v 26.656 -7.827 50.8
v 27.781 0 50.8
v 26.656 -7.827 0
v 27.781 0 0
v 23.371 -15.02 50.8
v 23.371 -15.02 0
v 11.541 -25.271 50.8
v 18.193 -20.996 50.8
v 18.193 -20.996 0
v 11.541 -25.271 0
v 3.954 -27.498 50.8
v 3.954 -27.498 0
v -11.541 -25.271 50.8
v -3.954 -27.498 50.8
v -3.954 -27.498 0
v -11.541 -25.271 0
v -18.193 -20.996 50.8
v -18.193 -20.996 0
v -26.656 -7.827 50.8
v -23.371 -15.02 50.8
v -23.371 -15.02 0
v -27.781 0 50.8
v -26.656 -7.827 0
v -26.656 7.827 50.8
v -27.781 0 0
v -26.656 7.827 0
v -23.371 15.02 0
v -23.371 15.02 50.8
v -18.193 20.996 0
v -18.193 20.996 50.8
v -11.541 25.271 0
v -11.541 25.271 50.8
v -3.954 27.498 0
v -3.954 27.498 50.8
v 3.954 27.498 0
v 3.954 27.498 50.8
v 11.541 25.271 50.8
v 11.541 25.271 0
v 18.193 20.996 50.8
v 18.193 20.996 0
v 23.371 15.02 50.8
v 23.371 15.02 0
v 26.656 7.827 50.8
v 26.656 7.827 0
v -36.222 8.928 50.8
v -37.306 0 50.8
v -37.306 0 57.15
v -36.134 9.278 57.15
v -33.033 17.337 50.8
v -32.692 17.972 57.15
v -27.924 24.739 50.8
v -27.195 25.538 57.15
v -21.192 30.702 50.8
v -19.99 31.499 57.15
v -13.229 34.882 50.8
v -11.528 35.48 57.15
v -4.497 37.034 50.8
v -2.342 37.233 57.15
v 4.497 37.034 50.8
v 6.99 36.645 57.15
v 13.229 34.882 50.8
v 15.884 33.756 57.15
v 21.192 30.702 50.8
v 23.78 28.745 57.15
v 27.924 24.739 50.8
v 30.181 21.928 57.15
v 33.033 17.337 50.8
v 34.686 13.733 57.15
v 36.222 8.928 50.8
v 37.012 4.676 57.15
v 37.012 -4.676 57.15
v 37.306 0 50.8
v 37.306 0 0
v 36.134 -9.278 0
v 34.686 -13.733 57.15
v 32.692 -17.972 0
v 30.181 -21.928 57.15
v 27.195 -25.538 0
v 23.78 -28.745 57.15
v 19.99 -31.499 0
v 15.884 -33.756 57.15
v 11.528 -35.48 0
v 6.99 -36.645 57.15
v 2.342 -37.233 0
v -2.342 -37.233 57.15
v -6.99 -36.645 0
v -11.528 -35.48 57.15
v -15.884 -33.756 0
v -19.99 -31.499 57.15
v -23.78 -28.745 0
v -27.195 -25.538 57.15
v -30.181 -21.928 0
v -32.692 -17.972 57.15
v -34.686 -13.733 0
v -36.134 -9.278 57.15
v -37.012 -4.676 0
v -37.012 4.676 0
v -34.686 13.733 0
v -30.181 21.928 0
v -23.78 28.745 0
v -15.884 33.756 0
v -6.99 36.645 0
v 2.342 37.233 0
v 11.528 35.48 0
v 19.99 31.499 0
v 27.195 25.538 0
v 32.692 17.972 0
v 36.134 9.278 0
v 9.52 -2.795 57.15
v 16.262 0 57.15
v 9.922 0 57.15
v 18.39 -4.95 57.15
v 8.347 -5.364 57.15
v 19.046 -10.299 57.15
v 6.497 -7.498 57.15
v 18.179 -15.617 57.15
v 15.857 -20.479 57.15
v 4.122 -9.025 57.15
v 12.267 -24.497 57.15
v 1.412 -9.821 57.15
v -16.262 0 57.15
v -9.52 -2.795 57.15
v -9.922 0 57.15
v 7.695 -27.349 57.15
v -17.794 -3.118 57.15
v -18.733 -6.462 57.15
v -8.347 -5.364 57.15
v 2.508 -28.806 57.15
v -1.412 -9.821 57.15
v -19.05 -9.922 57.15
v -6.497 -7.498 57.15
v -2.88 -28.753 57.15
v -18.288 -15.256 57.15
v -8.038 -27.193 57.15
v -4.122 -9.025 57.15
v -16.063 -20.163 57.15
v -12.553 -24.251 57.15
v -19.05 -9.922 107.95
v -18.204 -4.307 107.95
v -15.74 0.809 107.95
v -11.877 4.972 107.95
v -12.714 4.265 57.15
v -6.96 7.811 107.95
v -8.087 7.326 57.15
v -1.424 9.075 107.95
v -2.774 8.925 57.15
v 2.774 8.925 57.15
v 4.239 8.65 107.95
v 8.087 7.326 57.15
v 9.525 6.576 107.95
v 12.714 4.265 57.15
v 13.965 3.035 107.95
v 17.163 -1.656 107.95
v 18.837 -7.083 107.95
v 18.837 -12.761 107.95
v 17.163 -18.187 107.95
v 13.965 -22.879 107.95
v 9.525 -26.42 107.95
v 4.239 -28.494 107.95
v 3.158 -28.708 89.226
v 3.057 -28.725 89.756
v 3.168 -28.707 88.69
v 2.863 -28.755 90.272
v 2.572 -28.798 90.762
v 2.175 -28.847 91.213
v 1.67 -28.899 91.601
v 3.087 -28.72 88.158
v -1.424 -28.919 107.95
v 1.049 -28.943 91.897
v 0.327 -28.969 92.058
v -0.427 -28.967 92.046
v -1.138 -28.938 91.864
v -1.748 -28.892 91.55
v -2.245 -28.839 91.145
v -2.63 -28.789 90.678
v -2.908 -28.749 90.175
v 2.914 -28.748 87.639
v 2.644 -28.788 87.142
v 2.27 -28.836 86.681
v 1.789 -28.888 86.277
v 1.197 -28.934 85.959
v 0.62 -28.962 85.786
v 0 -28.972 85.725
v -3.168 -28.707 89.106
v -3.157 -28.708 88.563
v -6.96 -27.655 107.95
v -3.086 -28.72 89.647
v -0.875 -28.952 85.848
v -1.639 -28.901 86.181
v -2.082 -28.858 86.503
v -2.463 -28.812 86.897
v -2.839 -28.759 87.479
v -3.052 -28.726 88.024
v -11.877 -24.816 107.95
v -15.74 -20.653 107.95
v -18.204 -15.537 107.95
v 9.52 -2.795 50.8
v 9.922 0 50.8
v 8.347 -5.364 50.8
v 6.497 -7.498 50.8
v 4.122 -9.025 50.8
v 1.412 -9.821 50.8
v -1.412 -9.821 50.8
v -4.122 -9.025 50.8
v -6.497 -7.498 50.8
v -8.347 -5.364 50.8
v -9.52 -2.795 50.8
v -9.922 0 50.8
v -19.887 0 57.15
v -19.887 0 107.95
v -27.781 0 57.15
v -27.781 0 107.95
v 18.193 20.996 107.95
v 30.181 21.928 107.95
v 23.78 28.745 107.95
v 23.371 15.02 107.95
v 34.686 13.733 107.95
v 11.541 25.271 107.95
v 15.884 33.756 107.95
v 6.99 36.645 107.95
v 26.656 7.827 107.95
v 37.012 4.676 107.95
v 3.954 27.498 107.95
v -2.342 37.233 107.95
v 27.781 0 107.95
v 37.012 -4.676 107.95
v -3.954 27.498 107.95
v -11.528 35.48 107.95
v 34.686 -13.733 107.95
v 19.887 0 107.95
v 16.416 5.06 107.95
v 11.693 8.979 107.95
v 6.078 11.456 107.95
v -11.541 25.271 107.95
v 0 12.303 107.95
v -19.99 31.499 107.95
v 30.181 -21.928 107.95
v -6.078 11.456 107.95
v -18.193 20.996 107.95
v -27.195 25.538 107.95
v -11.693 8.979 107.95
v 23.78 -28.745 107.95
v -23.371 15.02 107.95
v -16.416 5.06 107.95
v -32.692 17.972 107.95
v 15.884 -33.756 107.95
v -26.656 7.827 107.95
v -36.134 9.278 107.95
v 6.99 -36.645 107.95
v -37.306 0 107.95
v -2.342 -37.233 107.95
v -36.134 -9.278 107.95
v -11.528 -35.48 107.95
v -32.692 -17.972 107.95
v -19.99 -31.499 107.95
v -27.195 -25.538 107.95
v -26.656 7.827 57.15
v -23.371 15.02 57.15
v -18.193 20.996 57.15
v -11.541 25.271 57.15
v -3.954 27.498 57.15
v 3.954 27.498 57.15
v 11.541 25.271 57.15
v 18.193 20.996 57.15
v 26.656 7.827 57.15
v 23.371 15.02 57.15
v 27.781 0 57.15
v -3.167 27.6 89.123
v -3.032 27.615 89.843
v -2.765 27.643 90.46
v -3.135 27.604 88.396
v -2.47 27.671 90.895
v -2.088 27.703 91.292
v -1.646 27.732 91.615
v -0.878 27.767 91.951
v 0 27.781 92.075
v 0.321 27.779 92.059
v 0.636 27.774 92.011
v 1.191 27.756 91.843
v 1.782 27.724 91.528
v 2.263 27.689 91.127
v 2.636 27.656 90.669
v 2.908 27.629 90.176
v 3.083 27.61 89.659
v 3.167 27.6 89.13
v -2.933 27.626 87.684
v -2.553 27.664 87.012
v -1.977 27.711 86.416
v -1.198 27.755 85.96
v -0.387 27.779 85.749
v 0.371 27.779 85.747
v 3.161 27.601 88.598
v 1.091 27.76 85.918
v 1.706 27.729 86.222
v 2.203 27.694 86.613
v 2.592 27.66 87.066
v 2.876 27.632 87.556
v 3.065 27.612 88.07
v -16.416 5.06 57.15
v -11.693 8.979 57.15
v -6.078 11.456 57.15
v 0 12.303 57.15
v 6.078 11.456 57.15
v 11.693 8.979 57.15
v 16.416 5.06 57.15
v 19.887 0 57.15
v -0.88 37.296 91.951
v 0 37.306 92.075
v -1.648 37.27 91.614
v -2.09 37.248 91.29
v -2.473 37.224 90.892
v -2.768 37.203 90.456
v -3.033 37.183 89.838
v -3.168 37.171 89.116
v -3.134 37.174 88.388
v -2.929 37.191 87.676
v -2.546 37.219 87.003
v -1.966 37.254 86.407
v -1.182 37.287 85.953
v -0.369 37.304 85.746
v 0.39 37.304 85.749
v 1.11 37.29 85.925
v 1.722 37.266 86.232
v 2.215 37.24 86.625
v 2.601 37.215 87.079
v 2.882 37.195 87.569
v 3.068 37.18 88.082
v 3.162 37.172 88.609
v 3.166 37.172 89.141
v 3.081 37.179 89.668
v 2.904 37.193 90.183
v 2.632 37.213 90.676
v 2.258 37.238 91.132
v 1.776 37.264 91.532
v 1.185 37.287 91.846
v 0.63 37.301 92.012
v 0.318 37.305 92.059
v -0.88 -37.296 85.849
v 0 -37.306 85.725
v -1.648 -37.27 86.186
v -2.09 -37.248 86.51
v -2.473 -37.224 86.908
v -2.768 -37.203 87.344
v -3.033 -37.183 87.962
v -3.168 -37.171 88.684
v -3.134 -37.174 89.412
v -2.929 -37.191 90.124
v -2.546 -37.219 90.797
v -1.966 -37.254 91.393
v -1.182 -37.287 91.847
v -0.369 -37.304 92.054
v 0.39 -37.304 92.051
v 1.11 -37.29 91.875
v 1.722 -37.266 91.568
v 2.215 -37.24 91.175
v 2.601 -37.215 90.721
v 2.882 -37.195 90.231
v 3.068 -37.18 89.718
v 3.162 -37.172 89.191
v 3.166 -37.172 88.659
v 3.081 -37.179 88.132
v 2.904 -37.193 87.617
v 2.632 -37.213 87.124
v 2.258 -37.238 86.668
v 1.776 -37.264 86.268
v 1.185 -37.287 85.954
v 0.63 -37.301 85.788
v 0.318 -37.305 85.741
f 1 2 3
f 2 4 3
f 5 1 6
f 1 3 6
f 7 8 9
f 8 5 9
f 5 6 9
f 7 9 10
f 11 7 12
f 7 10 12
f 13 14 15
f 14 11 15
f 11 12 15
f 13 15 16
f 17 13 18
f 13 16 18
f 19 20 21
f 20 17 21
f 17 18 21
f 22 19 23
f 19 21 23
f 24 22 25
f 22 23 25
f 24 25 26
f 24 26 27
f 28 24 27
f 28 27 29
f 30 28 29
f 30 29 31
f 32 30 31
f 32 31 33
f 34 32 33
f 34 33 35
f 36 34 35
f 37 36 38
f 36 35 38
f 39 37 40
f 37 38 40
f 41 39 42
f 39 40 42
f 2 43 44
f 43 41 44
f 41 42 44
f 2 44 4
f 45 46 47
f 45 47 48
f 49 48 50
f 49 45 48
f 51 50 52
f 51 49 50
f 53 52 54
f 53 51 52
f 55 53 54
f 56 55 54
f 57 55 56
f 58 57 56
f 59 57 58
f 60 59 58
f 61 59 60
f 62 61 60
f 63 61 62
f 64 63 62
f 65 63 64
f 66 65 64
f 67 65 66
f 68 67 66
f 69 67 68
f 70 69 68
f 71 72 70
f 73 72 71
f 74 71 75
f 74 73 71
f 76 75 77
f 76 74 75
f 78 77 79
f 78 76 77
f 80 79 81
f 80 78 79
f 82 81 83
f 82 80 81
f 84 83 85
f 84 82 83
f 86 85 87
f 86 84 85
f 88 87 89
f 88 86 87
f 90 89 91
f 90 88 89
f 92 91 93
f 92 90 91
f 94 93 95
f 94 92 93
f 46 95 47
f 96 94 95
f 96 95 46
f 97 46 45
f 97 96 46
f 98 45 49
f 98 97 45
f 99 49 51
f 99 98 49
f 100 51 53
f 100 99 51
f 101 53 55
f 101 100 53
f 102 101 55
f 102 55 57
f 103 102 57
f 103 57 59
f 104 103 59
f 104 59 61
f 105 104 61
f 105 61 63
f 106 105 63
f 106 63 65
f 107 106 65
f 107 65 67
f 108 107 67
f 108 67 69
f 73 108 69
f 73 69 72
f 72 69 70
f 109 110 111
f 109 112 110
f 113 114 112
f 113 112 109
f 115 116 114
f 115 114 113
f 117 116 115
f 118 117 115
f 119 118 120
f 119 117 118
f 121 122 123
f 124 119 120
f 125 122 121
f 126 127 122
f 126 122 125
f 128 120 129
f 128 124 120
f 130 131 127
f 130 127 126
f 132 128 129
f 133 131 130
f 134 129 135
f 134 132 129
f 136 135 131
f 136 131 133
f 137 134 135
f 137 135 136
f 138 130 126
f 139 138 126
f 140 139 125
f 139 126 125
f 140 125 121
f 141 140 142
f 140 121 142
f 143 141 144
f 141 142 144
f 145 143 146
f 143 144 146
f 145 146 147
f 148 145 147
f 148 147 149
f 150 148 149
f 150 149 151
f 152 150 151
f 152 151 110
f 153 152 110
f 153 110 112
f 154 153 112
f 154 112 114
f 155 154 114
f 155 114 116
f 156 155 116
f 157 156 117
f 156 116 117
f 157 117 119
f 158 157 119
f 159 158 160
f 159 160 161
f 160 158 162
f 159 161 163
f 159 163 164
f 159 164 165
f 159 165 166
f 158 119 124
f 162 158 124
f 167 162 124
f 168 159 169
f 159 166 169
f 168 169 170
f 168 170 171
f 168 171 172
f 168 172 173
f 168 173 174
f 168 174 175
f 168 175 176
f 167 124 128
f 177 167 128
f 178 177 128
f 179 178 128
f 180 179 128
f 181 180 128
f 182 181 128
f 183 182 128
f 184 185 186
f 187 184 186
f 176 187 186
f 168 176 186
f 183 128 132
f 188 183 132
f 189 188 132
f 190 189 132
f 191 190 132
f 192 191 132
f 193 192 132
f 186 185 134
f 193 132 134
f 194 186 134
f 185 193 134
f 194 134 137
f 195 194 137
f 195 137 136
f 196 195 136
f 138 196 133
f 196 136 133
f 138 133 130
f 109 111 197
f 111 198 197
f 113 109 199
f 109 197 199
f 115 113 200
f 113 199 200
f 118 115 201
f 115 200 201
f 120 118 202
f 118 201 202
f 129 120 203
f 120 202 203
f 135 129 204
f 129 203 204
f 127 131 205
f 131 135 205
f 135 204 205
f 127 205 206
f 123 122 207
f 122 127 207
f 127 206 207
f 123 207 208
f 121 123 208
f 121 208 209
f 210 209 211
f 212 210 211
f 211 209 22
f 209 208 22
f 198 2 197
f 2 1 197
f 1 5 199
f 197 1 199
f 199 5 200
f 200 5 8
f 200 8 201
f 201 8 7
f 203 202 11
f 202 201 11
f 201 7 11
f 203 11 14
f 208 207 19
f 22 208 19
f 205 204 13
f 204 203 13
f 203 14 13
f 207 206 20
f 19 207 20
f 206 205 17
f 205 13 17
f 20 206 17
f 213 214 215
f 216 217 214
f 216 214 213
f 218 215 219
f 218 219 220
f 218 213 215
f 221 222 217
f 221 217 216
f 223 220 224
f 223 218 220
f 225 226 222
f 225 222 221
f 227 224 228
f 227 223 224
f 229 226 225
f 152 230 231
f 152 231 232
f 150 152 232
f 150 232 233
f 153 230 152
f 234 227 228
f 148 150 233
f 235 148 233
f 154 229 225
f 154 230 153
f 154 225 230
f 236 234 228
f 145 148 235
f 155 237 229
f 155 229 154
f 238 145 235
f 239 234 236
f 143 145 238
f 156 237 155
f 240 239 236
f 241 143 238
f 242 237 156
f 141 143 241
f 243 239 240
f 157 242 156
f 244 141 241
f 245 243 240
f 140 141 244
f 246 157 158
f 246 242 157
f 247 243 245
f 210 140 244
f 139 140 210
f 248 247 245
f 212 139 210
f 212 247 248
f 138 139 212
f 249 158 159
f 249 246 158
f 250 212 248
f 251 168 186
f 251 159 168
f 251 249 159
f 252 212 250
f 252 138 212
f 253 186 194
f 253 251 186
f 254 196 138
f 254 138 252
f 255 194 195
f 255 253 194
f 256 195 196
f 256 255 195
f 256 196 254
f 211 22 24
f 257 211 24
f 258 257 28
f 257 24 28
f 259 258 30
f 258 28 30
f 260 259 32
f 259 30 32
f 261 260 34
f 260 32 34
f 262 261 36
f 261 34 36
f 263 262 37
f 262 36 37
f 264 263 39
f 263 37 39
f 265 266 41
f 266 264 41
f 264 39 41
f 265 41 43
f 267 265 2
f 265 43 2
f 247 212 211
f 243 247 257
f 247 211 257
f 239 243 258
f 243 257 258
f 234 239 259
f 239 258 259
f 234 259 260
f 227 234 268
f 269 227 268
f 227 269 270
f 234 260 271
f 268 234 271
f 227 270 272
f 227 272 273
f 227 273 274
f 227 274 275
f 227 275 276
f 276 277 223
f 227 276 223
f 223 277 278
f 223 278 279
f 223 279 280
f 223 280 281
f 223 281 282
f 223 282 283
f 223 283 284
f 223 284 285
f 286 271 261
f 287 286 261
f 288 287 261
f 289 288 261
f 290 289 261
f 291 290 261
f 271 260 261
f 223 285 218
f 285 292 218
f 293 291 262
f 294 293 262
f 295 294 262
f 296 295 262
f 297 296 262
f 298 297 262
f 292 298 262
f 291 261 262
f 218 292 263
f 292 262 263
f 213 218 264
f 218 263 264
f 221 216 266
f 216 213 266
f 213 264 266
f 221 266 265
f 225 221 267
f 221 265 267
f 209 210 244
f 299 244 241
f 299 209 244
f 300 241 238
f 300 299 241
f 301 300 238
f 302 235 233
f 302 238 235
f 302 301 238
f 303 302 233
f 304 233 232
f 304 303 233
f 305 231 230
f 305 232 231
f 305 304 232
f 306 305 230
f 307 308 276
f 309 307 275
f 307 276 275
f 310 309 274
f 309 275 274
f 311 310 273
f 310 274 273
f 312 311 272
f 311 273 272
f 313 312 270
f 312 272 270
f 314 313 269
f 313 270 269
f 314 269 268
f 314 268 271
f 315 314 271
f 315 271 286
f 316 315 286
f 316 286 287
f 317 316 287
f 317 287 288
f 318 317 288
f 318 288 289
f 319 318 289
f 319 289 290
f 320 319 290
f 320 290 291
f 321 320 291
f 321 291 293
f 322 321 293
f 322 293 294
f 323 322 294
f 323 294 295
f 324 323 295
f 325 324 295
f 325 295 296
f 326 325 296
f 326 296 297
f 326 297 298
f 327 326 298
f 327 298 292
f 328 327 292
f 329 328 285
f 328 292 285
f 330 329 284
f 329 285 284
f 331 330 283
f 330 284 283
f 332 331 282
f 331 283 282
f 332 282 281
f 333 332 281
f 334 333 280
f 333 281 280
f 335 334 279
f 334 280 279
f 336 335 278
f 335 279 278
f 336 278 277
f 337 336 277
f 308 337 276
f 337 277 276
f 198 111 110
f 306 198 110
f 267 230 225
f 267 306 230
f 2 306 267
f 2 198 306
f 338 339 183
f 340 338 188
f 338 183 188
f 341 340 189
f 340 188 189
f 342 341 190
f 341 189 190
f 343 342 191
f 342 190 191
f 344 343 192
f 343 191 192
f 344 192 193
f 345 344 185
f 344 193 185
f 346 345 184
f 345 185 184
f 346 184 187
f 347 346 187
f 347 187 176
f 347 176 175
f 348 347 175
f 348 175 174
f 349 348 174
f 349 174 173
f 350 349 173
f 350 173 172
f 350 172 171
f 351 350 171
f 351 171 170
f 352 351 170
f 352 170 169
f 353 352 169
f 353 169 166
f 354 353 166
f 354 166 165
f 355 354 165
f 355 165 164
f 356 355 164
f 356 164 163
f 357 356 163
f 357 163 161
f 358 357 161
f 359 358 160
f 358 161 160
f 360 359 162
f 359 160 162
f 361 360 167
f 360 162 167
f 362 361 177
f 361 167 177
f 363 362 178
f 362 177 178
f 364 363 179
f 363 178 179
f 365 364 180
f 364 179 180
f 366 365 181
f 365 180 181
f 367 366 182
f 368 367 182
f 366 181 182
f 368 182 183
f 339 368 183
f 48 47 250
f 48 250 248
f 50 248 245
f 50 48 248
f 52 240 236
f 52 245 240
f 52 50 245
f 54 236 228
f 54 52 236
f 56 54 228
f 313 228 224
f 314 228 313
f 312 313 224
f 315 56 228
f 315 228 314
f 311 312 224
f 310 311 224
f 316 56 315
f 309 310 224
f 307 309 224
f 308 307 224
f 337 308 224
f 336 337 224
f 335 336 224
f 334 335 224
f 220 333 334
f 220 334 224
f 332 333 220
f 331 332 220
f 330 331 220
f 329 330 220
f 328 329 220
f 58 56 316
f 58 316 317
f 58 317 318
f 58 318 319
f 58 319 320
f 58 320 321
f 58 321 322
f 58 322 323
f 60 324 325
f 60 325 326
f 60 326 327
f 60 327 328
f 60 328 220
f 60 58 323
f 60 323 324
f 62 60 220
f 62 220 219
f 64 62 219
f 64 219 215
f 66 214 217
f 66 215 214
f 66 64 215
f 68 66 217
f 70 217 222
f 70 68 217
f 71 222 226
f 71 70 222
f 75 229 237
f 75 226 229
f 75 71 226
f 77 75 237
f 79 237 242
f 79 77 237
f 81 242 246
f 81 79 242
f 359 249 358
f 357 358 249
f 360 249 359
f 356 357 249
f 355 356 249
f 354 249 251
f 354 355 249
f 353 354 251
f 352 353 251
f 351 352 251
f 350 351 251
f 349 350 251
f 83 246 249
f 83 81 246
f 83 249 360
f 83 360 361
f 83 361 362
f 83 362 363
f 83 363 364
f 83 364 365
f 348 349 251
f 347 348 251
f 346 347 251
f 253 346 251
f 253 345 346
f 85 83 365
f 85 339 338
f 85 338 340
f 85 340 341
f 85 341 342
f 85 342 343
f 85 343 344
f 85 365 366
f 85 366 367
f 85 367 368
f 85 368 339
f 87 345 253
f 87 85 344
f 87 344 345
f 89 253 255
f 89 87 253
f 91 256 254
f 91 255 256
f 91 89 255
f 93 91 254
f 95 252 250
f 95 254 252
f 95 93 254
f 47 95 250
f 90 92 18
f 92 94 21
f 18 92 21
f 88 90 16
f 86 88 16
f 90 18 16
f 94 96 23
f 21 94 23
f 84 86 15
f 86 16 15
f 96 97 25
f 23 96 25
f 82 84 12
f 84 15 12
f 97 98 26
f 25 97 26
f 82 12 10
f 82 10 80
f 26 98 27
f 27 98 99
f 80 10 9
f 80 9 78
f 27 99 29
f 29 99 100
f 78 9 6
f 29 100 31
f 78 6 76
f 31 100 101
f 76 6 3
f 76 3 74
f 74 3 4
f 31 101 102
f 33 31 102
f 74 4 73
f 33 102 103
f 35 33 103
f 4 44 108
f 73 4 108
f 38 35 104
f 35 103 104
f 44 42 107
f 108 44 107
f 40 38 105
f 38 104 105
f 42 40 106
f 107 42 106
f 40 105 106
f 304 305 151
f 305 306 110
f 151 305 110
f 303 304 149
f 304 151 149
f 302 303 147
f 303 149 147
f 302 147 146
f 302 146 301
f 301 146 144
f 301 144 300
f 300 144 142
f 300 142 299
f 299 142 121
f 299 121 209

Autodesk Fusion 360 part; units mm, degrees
sketch "Sketch8" plane through (0, 0, 0) normal (0, 0, 1) x (1, 0, 0)
  circle A0 centre (0, 0) radius 37.3062
  circle A1 centre (0, 0) radius 27.7812
  dimension "d25" = 74.6125
  dimension "d26" = 55.5625
extrude "Extrude4" add sketch "Sketch8" along normal blind 50.8
sketch "Sketch9" plane through (0, 0, 50.8) normal (0, 0, 1) x (-1, 0, 0)
  circle A0 centre (0, 0) radius 27.7812
  circle A1 centre (0, 0) radius 37.3062
  circle A2 centre (0, 0) radius 37.3062
  circle A3 centre (0, 0) radius 9.9219
  line L0 (0, 0) -> (-27.7812, 0)
  line L1 (0, 0) -> (27.7812, 0)
  dimension "d29" = 19.8438
extrude "Extrude5" add sketch "Sketch9" along normal blind 6.35 contours A0 A3 L0 L1 | A1 A2 picked at (-14.6242, 16.1245)
sketch "Sketch10" plane through (0, 0, 57.15) normal (0, 0, 1) x (-1, 0, 0)
  arc A0 (9.9219, 0) -> (-9.9219, 0) centre (0, 0) ccw
  line L0 (9.9219, 0) -> (27.7812, 0)
  arc A1 (-27.7812, 0) -> (27.7812, 0) centre (0, 0) ccw
  line L1 (-27.7812, 0) -> (-9.9219, 0)
  circle A2 centre (0, 0) radius 37.3062
  line L2 (0, 0) -> (0, 9.9219)
  circle A3 centre (0, 9.9219) radius 19.05
  circle A4 centre (0, 9.9219) radius 22.225
  circle A5 centre (0, 0) radius 32.1469
  circle A6 centre (0, 0) radius 37.3062
  circle A7 centre (0, 0) radius 27.7812
  line L3 (27.7812, 0) -> (19.8874, 0)
  line L4 (-19.8874, 0) -> (-27.7812, 0)
  dimension "d32" = 38.1
  dimension "d33" = 44.45
extrude "Extrude6" add sketch "Sketch10" along normal blind 50.8 contours L0 A3 A4 A7 | L0 L1 A3 A4 | L0 A4 A7 L3 | L1 A3 A4 A7 | A5 | L1 A4 A7 L4 | A3 A4 A7 | A2 A6
ref_plane "WorkPlane1" through (0, -38.1, 0) normal (0, 1, 0) x (0, 0, 1)
sketch "Sketch11" plane through (0, -38.1, 0) normal (0, 1, 0) x (1, 0, 0)
  line L0 (0, 0) -> (0, -88.9)
  circle A0 centre (0, -88.9) radius 3.175
  dimension "d37" = 6.35
hole "Hole2" at (0, -38.1, 88.9) direction (0, 1, 0) diameter 6.35 depth 15.24 tip angle 118
ref_plane "WorkPlane2" through (0, 38.1, 0) normal (0, 1, 0) x (0, 0, 1)
sketch "Sketch12" plane through (0, 38.1, 0) normal (0, 1, 0) x (1, 0, 0)
  line L0 (0, 0) -> (0, -88.9)
  circle A0 centre (0, -88.9) radius 3.175
  line L1 (0, -88.9) -> (0, -107.95)
  dimension "d42" = 88.9
  dimension "d43" = 6.35
  dimension "d47" = 19.05
hole "Hole3" at (0, 38.1, 88.9) direction (0, -1, 0) diameter 6.35 depth 15.24 tip angle 118
sketch "Sketch7" plane through (0, 0, 0) normal (0, 0, 1) x (1, 0, 0)
equation "d25 = 3 in - ( ( 1 / 16 ) * 1 in )"
equation "d26 = 3 in - ( ( 1 / 16 ) * 1 in ) - ( ( 3 / 4 ) * 1 in )"
equation "d29 = ( ( 3 / 4 ) * 1 in ) + ( 1 / 32 ) * 1 in"
equation "d33 = 1.5 in + ( ( 1 / 4 ) * 1 in )"
